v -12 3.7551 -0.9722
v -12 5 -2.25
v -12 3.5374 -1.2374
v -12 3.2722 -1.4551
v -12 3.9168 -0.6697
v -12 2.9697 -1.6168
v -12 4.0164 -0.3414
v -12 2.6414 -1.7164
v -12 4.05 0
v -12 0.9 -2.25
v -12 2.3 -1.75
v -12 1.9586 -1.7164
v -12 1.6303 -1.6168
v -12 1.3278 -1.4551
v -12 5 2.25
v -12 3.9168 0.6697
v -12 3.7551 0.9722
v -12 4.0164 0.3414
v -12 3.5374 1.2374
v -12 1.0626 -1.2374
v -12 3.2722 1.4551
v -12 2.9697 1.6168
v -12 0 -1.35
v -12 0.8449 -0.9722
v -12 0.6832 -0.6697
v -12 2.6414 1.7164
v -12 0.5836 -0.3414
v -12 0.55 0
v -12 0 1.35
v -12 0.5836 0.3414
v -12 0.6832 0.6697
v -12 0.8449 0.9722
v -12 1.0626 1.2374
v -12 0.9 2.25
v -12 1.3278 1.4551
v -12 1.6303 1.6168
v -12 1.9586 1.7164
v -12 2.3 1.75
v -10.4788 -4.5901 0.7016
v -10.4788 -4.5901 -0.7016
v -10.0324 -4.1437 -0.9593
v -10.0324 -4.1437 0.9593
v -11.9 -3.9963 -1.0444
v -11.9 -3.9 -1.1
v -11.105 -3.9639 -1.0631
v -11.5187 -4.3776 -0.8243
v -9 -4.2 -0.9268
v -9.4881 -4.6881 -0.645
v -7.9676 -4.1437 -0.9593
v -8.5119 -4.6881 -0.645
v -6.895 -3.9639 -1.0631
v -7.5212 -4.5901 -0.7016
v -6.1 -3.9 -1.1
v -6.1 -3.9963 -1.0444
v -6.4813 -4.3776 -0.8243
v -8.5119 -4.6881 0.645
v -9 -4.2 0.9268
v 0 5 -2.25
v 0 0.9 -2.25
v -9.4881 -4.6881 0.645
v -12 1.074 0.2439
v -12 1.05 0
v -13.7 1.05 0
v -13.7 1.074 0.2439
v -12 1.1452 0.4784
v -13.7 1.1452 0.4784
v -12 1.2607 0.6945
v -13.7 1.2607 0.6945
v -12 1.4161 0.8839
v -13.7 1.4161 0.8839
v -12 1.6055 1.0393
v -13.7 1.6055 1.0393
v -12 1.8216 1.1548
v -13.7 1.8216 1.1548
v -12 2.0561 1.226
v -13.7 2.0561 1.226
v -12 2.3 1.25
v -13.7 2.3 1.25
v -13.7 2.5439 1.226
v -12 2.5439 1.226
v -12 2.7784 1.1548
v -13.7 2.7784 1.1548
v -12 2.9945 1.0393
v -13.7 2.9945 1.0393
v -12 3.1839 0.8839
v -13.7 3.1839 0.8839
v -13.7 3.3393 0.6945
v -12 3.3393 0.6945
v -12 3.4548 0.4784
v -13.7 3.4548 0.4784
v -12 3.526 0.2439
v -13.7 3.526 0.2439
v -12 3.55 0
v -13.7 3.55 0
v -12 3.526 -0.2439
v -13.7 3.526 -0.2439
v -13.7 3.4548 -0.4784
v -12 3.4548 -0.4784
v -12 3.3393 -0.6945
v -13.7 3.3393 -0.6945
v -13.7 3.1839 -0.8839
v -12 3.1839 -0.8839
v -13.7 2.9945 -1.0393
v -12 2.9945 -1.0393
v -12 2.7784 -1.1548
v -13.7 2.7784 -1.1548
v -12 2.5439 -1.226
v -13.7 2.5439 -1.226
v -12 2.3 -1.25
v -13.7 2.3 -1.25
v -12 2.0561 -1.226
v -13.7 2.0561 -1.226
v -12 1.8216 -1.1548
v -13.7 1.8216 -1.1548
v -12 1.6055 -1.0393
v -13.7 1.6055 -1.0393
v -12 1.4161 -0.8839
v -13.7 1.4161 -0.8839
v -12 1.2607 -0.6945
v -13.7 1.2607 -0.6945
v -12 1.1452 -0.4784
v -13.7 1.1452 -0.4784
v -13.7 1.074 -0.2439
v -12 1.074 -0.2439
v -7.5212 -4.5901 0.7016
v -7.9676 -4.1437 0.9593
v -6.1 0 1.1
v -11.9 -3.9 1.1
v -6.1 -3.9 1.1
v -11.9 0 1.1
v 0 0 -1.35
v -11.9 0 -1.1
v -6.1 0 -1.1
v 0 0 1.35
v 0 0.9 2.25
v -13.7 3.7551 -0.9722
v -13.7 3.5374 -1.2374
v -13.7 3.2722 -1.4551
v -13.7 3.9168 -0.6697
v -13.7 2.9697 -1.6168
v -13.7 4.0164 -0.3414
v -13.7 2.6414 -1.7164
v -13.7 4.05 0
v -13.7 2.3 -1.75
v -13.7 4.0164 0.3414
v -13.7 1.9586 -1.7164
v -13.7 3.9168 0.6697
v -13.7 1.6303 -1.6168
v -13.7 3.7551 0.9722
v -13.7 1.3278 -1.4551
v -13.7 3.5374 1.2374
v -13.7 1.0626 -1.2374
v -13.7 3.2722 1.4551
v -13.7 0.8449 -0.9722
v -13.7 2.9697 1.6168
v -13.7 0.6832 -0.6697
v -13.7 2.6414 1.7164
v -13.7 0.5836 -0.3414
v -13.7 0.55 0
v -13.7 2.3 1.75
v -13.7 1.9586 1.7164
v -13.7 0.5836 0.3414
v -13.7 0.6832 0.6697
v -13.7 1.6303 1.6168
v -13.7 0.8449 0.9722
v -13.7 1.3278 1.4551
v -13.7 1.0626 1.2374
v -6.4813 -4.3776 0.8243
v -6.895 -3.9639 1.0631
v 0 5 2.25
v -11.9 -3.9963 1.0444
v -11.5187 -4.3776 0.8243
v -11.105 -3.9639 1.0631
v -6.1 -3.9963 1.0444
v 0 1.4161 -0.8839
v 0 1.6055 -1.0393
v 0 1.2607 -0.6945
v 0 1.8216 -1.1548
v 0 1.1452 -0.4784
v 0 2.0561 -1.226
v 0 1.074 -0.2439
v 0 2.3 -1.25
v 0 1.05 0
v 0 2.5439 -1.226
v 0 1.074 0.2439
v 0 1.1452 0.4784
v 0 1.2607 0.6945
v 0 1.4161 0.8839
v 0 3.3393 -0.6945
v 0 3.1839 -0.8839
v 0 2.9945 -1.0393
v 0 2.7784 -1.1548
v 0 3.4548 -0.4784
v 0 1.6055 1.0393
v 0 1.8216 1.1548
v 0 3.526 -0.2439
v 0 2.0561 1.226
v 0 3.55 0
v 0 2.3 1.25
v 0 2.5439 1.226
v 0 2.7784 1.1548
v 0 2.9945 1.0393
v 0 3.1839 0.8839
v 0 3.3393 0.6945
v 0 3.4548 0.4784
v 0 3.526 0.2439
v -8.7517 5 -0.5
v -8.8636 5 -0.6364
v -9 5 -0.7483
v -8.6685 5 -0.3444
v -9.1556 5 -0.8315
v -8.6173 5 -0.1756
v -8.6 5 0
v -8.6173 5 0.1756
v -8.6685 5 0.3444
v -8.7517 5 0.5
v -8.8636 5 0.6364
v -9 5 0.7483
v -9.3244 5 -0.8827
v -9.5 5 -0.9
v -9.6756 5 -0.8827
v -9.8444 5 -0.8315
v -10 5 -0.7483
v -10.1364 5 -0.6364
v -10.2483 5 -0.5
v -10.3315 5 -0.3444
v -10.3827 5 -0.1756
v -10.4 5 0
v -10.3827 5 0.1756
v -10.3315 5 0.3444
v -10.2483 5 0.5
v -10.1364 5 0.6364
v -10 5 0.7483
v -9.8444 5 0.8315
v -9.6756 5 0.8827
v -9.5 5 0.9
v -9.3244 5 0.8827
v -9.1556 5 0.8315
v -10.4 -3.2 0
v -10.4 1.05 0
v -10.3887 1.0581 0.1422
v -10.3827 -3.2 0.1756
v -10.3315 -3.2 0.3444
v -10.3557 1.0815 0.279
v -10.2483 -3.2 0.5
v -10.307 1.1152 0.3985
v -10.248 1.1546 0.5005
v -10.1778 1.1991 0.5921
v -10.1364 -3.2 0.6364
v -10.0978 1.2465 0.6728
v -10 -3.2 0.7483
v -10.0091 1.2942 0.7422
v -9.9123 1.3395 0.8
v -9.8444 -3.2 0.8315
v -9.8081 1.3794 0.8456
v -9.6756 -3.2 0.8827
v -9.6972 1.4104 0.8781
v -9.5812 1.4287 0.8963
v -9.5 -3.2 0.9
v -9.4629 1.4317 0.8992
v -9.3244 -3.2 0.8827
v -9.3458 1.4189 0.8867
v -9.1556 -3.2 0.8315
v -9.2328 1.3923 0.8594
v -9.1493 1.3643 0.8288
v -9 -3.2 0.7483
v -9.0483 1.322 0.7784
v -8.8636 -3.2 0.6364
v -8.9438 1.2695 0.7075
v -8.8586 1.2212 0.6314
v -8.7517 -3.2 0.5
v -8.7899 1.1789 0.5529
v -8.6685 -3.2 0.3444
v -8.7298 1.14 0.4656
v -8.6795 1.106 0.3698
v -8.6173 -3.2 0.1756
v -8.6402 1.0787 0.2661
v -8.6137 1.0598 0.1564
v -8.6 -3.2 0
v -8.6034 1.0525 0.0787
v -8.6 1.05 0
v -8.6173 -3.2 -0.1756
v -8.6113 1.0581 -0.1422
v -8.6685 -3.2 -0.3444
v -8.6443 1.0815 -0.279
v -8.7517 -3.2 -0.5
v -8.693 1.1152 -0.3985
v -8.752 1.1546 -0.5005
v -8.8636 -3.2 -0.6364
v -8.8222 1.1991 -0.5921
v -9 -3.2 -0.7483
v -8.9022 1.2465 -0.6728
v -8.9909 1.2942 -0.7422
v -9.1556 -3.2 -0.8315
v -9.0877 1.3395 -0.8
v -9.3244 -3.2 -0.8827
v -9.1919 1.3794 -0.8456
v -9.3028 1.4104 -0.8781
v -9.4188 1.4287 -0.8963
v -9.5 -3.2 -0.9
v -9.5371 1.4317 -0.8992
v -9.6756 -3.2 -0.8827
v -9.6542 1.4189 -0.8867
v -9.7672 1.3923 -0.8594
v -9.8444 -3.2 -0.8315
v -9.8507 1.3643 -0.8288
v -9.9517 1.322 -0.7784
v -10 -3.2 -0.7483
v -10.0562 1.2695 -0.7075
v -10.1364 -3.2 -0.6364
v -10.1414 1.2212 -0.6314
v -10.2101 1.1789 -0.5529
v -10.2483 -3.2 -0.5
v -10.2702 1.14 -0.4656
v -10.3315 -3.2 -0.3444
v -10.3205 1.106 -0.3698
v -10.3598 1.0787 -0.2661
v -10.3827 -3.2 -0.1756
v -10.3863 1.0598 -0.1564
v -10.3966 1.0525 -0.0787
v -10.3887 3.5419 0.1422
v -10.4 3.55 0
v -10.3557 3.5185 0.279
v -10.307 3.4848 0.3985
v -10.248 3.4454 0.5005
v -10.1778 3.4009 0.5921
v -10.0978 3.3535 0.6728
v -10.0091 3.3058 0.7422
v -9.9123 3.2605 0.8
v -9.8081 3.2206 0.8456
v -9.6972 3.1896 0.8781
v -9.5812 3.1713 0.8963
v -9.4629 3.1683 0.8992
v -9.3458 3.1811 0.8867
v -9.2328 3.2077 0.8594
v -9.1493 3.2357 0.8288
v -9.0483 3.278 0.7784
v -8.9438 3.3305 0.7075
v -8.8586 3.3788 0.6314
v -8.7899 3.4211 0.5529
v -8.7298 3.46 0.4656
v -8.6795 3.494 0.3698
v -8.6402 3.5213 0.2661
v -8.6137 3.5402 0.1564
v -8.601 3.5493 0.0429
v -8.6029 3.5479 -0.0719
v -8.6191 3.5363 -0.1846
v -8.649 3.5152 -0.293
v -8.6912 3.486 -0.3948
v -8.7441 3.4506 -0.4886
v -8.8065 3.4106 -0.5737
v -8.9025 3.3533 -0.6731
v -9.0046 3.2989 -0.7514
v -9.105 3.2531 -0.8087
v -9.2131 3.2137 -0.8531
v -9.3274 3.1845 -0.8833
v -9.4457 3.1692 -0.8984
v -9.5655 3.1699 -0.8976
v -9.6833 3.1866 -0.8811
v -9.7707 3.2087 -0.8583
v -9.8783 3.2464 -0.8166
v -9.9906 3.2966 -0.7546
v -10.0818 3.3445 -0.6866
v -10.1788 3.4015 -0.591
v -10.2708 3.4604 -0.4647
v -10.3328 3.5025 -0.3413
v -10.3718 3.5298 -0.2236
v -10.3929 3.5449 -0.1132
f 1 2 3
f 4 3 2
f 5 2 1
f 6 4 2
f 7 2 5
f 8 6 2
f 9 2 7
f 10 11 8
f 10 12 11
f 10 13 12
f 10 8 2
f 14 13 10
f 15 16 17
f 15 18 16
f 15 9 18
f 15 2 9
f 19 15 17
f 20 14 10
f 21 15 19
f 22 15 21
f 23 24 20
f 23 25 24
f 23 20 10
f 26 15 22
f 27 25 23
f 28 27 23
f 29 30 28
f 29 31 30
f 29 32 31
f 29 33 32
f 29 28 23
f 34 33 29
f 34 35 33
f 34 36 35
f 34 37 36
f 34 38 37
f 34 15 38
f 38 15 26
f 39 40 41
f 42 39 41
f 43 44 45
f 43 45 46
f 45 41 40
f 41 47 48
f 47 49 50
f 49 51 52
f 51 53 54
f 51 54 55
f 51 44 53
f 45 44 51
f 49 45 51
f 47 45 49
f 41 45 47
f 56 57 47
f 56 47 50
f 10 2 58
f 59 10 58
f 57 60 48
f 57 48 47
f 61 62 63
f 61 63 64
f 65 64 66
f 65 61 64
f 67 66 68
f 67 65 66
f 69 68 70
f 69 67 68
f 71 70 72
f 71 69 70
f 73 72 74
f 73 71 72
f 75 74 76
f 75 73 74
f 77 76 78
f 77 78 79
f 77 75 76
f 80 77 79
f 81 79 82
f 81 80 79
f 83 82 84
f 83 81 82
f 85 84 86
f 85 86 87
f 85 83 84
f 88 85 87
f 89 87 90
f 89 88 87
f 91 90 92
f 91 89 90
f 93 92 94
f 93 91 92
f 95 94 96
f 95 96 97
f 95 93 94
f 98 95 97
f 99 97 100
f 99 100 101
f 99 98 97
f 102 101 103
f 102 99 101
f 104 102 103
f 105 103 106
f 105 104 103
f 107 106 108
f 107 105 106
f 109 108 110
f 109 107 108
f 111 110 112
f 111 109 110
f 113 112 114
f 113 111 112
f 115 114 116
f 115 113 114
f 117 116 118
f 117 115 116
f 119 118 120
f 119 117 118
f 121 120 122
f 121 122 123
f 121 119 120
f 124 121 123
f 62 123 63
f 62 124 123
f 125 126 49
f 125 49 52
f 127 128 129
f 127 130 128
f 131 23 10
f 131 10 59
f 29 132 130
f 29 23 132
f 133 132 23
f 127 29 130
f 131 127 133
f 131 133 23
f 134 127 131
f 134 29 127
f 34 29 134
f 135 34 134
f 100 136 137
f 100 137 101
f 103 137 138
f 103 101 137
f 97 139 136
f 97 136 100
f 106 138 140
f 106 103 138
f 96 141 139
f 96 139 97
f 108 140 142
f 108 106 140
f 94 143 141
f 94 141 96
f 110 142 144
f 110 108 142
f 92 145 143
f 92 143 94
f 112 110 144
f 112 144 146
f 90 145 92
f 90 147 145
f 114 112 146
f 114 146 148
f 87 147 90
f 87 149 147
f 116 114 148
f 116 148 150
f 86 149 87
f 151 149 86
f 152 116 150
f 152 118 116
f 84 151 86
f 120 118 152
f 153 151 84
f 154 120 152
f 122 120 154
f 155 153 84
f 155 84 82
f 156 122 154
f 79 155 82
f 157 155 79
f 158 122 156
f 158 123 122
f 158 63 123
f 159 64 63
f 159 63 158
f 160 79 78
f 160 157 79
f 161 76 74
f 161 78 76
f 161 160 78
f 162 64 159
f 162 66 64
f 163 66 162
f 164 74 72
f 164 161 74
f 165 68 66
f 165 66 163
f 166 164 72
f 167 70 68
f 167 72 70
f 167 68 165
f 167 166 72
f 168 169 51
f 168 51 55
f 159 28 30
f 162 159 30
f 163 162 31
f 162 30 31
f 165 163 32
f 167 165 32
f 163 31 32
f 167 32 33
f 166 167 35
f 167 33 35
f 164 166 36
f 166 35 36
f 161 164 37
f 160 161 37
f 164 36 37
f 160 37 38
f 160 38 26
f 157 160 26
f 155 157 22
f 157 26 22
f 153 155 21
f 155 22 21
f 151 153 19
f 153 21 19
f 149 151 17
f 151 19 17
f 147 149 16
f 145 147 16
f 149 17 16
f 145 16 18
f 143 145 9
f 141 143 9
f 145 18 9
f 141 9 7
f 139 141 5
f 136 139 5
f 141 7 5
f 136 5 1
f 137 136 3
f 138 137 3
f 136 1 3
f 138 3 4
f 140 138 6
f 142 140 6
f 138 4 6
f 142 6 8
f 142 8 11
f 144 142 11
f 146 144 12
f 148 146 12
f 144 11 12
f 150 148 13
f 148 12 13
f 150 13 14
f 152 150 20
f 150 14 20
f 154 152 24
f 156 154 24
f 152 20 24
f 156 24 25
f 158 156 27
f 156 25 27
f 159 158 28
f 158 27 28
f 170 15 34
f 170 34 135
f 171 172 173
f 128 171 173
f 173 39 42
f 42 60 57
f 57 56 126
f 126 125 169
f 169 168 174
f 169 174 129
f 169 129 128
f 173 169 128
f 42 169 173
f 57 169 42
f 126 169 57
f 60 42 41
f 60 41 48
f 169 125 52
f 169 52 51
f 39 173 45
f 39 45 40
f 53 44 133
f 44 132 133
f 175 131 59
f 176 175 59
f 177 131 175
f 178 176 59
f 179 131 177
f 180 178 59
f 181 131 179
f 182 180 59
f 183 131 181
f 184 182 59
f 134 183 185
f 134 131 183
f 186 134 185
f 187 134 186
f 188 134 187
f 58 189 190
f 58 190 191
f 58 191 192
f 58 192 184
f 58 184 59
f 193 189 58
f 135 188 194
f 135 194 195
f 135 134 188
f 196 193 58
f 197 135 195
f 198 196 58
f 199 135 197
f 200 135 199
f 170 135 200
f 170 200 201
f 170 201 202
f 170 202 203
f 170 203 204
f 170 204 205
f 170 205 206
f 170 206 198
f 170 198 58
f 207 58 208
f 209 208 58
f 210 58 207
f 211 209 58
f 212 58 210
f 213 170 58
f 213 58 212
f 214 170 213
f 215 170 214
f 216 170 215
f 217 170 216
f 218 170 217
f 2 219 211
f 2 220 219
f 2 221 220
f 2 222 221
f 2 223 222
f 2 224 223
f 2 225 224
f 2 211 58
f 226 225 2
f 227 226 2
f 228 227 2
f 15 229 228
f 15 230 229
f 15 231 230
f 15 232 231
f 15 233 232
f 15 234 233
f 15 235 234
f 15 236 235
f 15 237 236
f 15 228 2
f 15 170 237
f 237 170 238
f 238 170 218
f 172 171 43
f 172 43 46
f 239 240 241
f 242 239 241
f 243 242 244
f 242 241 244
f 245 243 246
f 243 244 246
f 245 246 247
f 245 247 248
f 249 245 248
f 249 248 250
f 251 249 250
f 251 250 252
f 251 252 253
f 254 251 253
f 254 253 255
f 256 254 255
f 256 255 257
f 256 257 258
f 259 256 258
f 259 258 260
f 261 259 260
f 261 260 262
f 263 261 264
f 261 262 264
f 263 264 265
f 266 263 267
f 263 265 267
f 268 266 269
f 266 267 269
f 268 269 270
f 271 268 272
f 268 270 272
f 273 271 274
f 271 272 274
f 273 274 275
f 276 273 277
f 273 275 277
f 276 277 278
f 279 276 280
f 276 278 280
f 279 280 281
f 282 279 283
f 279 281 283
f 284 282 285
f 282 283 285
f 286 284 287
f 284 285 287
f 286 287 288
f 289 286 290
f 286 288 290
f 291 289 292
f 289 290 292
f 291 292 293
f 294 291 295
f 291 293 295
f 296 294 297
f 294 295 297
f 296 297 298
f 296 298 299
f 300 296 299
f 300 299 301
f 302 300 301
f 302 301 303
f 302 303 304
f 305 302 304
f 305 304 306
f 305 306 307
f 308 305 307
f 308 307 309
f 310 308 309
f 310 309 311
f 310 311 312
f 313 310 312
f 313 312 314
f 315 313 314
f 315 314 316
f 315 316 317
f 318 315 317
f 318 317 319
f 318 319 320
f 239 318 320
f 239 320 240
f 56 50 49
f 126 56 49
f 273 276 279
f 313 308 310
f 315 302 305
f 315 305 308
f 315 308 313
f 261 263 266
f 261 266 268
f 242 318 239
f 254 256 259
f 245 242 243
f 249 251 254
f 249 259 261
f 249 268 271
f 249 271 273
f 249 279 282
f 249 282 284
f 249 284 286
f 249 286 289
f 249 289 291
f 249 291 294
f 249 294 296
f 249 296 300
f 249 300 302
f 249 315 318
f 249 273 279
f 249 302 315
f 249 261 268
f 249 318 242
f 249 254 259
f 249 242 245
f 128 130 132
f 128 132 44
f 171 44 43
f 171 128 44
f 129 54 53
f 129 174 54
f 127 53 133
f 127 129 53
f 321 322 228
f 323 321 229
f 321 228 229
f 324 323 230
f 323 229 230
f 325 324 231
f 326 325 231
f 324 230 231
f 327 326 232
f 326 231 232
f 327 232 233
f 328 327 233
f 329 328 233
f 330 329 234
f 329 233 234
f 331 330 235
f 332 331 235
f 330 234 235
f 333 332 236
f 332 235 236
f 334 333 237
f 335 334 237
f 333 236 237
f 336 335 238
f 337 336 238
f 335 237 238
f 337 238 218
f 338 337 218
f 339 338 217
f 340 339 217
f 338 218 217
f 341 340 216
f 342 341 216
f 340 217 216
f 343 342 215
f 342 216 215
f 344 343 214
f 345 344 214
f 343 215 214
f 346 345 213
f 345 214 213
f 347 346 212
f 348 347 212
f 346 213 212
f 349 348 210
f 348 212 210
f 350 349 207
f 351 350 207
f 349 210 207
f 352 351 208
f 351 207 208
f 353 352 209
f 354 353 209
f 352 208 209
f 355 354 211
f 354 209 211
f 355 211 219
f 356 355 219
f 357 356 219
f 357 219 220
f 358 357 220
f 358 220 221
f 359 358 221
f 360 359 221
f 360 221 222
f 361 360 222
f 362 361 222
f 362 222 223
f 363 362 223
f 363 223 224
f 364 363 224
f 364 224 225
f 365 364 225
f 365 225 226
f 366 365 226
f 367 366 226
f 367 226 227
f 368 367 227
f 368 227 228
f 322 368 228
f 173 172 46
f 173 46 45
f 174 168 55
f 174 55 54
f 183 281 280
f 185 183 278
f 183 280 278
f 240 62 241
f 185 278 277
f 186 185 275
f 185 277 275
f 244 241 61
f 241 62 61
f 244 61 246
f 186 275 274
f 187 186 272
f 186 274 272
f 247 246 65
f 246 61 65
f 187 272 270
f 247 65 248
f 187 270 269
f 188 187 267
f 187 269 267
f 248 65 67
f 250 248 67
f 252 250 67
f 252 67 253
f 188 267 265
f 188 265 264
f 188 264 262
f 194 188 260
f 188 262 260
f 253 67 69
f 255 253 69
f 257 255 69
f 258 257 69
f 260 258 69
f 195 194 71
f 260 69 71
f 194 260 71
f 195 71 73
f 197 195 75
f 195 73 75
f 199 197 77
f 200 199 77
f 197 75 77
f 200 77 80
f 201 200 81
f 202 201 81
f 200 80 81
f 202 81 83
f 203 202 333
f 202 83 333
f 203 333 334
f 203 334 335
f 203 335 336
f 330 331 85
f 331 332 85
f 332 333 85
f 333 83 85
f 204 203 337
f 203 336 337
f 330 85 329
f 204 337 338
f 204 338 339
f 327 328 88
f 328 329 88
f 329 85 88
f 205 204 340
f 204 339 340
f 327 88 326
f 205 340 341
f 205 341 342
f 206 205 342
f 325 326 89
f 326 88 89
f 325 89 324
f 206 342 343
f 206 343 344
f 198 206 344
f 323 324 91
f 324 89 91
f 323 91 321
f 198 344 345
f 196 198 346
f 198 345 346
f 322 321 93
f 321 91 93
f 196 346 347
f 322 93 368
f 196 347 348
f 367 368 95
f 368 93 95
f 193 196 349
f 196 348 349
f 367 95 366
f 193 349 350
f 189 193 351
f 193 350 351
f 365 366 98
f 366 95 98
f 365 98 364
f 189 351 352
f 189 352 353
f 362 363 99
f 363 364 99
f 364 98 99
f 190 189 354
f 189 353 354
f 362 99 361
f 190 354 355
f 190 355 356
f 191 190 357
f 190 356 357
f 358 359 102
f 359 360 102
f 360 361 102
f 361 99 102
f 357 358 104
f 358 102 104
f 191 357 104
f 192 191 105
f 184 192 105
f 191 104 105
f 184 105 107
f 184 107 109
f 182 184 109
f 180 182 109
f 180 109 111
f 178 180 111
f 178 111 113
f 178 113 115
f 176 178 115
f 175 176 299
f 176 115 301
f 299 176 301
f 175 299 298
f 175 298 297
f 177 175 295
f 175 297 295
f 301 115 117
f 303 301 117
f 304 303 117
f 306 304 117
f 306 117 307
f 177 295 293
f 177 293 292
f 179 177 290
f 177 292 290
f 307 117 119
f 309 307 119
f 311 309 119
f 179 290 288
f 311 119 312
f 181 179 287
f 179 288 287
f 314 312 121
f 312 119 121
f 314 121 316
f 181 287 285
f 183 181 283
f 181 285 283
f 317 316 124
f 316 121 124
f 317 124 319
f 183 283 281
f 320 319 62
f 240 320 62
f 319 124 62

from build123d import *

# Parameters (mm, degrees)
F1_DEPTH  = 2.25
F2_DEPTH  = 1.1
F3_SIZE   = 0.9
F5_DEPTH  = 12
F6_R      = 1.75
F6_R_2    = 1.25
F7_DEPTH  = 1.7
F8_DEPTH  = 12.001
F9_R      = 0.9
F10_DEPTH = 8.2


with BuildPart() as f1:
    # F0 (on Top) → F1 (new body, symmetric)
    with BuildSketch(Plane.XY):
        Polygon((0, 0), (0, 5), (-12, 5), (-12, 0), (-11.9, 0), (-6.1, 0), align=None)
    extrude(amount=F1_DEPTH, both=True)

    # F0 (on Top) → F2 (join, symmetric)
    with BuildSketch(Plane.XY):
        Polygon((-6.1, -3.996311), (-6.1, 0), (-11.9, 0), (-11.9, -3.996311), (-11.5187, -4.377611), (-11.104953, -3.963864), (-10.478758, -4.590059), (-10.032431, -4.143733), (-9.488082, -4.688082), (-9, -4.2), (-8.511918, -4.688082), (-7.967569, -4.143733), (-7.521242, -4.590059), (-6.895047, -3.963864), (-6.4813, -4.377611), align=None)
    extrude(amount=F2_DEPTH, both=True)

    # F3
    f3_edges = [f1.edges().sort_by_distance(p)[0] for p in [
        (-6, 0, 2.25),
        (-6, 0, -2.25),
    ]]
    chamfer(f3_edges, length=F3_SIZE)

    # F4 (on Right) → F5 (cut)
    with BuildSketch(Plane.YZ):
        Polygon((-4.9, 0.52265), (-3.9, 1.1), (-4.9, 1.1), align=None)
        Polygon((-4.9, -1.1), (-3.9, -1.1), (-4.9, -0.52265), align=None)
    extrude(amount=-F5_DEPTH, mode=Mode.SUBTRACT)

    # F6 (on face) → F7 (join)
    with BuildSketch(Plane(origin=(-12, 0, 0), x_dir=(0, -1, 0), z_dir=(-1, 0, 0))):
        with Locations((-2.3, 0)):
            Circle(F6_R)
        with Locations((-2.3, 0)):
            Circle(F6_R_2, mode=Mode.SUBTRACT)
    extrude(amount=F7_DEPTH)

    # F6 (on face) → F8 (cut, through all)
    with BuildSketch(Plane(origin=(-12, 0, 0), x_dir=(0, -1, 0), z_dir=(-1, 0, 0))):
        with Locations((-2.3, 0)):
            Circle(F6_R_2)
    extrude(amount=-F8_DEPTH, mode=Mode.SUBTRACT)

    # F9 (on face) → F10 (cut)
    with BuildSketch(Plane(origin=(0, 5, 0), x_dir=(-1, 0, 0), z_dir=(0, 1, 0))):
        with Locations((9.5, 0)):
            Circle(F9_R)
    extrude(amount=-F10_DEPTH, mode=Mode.SUBTRACT)


solid = f1.part
